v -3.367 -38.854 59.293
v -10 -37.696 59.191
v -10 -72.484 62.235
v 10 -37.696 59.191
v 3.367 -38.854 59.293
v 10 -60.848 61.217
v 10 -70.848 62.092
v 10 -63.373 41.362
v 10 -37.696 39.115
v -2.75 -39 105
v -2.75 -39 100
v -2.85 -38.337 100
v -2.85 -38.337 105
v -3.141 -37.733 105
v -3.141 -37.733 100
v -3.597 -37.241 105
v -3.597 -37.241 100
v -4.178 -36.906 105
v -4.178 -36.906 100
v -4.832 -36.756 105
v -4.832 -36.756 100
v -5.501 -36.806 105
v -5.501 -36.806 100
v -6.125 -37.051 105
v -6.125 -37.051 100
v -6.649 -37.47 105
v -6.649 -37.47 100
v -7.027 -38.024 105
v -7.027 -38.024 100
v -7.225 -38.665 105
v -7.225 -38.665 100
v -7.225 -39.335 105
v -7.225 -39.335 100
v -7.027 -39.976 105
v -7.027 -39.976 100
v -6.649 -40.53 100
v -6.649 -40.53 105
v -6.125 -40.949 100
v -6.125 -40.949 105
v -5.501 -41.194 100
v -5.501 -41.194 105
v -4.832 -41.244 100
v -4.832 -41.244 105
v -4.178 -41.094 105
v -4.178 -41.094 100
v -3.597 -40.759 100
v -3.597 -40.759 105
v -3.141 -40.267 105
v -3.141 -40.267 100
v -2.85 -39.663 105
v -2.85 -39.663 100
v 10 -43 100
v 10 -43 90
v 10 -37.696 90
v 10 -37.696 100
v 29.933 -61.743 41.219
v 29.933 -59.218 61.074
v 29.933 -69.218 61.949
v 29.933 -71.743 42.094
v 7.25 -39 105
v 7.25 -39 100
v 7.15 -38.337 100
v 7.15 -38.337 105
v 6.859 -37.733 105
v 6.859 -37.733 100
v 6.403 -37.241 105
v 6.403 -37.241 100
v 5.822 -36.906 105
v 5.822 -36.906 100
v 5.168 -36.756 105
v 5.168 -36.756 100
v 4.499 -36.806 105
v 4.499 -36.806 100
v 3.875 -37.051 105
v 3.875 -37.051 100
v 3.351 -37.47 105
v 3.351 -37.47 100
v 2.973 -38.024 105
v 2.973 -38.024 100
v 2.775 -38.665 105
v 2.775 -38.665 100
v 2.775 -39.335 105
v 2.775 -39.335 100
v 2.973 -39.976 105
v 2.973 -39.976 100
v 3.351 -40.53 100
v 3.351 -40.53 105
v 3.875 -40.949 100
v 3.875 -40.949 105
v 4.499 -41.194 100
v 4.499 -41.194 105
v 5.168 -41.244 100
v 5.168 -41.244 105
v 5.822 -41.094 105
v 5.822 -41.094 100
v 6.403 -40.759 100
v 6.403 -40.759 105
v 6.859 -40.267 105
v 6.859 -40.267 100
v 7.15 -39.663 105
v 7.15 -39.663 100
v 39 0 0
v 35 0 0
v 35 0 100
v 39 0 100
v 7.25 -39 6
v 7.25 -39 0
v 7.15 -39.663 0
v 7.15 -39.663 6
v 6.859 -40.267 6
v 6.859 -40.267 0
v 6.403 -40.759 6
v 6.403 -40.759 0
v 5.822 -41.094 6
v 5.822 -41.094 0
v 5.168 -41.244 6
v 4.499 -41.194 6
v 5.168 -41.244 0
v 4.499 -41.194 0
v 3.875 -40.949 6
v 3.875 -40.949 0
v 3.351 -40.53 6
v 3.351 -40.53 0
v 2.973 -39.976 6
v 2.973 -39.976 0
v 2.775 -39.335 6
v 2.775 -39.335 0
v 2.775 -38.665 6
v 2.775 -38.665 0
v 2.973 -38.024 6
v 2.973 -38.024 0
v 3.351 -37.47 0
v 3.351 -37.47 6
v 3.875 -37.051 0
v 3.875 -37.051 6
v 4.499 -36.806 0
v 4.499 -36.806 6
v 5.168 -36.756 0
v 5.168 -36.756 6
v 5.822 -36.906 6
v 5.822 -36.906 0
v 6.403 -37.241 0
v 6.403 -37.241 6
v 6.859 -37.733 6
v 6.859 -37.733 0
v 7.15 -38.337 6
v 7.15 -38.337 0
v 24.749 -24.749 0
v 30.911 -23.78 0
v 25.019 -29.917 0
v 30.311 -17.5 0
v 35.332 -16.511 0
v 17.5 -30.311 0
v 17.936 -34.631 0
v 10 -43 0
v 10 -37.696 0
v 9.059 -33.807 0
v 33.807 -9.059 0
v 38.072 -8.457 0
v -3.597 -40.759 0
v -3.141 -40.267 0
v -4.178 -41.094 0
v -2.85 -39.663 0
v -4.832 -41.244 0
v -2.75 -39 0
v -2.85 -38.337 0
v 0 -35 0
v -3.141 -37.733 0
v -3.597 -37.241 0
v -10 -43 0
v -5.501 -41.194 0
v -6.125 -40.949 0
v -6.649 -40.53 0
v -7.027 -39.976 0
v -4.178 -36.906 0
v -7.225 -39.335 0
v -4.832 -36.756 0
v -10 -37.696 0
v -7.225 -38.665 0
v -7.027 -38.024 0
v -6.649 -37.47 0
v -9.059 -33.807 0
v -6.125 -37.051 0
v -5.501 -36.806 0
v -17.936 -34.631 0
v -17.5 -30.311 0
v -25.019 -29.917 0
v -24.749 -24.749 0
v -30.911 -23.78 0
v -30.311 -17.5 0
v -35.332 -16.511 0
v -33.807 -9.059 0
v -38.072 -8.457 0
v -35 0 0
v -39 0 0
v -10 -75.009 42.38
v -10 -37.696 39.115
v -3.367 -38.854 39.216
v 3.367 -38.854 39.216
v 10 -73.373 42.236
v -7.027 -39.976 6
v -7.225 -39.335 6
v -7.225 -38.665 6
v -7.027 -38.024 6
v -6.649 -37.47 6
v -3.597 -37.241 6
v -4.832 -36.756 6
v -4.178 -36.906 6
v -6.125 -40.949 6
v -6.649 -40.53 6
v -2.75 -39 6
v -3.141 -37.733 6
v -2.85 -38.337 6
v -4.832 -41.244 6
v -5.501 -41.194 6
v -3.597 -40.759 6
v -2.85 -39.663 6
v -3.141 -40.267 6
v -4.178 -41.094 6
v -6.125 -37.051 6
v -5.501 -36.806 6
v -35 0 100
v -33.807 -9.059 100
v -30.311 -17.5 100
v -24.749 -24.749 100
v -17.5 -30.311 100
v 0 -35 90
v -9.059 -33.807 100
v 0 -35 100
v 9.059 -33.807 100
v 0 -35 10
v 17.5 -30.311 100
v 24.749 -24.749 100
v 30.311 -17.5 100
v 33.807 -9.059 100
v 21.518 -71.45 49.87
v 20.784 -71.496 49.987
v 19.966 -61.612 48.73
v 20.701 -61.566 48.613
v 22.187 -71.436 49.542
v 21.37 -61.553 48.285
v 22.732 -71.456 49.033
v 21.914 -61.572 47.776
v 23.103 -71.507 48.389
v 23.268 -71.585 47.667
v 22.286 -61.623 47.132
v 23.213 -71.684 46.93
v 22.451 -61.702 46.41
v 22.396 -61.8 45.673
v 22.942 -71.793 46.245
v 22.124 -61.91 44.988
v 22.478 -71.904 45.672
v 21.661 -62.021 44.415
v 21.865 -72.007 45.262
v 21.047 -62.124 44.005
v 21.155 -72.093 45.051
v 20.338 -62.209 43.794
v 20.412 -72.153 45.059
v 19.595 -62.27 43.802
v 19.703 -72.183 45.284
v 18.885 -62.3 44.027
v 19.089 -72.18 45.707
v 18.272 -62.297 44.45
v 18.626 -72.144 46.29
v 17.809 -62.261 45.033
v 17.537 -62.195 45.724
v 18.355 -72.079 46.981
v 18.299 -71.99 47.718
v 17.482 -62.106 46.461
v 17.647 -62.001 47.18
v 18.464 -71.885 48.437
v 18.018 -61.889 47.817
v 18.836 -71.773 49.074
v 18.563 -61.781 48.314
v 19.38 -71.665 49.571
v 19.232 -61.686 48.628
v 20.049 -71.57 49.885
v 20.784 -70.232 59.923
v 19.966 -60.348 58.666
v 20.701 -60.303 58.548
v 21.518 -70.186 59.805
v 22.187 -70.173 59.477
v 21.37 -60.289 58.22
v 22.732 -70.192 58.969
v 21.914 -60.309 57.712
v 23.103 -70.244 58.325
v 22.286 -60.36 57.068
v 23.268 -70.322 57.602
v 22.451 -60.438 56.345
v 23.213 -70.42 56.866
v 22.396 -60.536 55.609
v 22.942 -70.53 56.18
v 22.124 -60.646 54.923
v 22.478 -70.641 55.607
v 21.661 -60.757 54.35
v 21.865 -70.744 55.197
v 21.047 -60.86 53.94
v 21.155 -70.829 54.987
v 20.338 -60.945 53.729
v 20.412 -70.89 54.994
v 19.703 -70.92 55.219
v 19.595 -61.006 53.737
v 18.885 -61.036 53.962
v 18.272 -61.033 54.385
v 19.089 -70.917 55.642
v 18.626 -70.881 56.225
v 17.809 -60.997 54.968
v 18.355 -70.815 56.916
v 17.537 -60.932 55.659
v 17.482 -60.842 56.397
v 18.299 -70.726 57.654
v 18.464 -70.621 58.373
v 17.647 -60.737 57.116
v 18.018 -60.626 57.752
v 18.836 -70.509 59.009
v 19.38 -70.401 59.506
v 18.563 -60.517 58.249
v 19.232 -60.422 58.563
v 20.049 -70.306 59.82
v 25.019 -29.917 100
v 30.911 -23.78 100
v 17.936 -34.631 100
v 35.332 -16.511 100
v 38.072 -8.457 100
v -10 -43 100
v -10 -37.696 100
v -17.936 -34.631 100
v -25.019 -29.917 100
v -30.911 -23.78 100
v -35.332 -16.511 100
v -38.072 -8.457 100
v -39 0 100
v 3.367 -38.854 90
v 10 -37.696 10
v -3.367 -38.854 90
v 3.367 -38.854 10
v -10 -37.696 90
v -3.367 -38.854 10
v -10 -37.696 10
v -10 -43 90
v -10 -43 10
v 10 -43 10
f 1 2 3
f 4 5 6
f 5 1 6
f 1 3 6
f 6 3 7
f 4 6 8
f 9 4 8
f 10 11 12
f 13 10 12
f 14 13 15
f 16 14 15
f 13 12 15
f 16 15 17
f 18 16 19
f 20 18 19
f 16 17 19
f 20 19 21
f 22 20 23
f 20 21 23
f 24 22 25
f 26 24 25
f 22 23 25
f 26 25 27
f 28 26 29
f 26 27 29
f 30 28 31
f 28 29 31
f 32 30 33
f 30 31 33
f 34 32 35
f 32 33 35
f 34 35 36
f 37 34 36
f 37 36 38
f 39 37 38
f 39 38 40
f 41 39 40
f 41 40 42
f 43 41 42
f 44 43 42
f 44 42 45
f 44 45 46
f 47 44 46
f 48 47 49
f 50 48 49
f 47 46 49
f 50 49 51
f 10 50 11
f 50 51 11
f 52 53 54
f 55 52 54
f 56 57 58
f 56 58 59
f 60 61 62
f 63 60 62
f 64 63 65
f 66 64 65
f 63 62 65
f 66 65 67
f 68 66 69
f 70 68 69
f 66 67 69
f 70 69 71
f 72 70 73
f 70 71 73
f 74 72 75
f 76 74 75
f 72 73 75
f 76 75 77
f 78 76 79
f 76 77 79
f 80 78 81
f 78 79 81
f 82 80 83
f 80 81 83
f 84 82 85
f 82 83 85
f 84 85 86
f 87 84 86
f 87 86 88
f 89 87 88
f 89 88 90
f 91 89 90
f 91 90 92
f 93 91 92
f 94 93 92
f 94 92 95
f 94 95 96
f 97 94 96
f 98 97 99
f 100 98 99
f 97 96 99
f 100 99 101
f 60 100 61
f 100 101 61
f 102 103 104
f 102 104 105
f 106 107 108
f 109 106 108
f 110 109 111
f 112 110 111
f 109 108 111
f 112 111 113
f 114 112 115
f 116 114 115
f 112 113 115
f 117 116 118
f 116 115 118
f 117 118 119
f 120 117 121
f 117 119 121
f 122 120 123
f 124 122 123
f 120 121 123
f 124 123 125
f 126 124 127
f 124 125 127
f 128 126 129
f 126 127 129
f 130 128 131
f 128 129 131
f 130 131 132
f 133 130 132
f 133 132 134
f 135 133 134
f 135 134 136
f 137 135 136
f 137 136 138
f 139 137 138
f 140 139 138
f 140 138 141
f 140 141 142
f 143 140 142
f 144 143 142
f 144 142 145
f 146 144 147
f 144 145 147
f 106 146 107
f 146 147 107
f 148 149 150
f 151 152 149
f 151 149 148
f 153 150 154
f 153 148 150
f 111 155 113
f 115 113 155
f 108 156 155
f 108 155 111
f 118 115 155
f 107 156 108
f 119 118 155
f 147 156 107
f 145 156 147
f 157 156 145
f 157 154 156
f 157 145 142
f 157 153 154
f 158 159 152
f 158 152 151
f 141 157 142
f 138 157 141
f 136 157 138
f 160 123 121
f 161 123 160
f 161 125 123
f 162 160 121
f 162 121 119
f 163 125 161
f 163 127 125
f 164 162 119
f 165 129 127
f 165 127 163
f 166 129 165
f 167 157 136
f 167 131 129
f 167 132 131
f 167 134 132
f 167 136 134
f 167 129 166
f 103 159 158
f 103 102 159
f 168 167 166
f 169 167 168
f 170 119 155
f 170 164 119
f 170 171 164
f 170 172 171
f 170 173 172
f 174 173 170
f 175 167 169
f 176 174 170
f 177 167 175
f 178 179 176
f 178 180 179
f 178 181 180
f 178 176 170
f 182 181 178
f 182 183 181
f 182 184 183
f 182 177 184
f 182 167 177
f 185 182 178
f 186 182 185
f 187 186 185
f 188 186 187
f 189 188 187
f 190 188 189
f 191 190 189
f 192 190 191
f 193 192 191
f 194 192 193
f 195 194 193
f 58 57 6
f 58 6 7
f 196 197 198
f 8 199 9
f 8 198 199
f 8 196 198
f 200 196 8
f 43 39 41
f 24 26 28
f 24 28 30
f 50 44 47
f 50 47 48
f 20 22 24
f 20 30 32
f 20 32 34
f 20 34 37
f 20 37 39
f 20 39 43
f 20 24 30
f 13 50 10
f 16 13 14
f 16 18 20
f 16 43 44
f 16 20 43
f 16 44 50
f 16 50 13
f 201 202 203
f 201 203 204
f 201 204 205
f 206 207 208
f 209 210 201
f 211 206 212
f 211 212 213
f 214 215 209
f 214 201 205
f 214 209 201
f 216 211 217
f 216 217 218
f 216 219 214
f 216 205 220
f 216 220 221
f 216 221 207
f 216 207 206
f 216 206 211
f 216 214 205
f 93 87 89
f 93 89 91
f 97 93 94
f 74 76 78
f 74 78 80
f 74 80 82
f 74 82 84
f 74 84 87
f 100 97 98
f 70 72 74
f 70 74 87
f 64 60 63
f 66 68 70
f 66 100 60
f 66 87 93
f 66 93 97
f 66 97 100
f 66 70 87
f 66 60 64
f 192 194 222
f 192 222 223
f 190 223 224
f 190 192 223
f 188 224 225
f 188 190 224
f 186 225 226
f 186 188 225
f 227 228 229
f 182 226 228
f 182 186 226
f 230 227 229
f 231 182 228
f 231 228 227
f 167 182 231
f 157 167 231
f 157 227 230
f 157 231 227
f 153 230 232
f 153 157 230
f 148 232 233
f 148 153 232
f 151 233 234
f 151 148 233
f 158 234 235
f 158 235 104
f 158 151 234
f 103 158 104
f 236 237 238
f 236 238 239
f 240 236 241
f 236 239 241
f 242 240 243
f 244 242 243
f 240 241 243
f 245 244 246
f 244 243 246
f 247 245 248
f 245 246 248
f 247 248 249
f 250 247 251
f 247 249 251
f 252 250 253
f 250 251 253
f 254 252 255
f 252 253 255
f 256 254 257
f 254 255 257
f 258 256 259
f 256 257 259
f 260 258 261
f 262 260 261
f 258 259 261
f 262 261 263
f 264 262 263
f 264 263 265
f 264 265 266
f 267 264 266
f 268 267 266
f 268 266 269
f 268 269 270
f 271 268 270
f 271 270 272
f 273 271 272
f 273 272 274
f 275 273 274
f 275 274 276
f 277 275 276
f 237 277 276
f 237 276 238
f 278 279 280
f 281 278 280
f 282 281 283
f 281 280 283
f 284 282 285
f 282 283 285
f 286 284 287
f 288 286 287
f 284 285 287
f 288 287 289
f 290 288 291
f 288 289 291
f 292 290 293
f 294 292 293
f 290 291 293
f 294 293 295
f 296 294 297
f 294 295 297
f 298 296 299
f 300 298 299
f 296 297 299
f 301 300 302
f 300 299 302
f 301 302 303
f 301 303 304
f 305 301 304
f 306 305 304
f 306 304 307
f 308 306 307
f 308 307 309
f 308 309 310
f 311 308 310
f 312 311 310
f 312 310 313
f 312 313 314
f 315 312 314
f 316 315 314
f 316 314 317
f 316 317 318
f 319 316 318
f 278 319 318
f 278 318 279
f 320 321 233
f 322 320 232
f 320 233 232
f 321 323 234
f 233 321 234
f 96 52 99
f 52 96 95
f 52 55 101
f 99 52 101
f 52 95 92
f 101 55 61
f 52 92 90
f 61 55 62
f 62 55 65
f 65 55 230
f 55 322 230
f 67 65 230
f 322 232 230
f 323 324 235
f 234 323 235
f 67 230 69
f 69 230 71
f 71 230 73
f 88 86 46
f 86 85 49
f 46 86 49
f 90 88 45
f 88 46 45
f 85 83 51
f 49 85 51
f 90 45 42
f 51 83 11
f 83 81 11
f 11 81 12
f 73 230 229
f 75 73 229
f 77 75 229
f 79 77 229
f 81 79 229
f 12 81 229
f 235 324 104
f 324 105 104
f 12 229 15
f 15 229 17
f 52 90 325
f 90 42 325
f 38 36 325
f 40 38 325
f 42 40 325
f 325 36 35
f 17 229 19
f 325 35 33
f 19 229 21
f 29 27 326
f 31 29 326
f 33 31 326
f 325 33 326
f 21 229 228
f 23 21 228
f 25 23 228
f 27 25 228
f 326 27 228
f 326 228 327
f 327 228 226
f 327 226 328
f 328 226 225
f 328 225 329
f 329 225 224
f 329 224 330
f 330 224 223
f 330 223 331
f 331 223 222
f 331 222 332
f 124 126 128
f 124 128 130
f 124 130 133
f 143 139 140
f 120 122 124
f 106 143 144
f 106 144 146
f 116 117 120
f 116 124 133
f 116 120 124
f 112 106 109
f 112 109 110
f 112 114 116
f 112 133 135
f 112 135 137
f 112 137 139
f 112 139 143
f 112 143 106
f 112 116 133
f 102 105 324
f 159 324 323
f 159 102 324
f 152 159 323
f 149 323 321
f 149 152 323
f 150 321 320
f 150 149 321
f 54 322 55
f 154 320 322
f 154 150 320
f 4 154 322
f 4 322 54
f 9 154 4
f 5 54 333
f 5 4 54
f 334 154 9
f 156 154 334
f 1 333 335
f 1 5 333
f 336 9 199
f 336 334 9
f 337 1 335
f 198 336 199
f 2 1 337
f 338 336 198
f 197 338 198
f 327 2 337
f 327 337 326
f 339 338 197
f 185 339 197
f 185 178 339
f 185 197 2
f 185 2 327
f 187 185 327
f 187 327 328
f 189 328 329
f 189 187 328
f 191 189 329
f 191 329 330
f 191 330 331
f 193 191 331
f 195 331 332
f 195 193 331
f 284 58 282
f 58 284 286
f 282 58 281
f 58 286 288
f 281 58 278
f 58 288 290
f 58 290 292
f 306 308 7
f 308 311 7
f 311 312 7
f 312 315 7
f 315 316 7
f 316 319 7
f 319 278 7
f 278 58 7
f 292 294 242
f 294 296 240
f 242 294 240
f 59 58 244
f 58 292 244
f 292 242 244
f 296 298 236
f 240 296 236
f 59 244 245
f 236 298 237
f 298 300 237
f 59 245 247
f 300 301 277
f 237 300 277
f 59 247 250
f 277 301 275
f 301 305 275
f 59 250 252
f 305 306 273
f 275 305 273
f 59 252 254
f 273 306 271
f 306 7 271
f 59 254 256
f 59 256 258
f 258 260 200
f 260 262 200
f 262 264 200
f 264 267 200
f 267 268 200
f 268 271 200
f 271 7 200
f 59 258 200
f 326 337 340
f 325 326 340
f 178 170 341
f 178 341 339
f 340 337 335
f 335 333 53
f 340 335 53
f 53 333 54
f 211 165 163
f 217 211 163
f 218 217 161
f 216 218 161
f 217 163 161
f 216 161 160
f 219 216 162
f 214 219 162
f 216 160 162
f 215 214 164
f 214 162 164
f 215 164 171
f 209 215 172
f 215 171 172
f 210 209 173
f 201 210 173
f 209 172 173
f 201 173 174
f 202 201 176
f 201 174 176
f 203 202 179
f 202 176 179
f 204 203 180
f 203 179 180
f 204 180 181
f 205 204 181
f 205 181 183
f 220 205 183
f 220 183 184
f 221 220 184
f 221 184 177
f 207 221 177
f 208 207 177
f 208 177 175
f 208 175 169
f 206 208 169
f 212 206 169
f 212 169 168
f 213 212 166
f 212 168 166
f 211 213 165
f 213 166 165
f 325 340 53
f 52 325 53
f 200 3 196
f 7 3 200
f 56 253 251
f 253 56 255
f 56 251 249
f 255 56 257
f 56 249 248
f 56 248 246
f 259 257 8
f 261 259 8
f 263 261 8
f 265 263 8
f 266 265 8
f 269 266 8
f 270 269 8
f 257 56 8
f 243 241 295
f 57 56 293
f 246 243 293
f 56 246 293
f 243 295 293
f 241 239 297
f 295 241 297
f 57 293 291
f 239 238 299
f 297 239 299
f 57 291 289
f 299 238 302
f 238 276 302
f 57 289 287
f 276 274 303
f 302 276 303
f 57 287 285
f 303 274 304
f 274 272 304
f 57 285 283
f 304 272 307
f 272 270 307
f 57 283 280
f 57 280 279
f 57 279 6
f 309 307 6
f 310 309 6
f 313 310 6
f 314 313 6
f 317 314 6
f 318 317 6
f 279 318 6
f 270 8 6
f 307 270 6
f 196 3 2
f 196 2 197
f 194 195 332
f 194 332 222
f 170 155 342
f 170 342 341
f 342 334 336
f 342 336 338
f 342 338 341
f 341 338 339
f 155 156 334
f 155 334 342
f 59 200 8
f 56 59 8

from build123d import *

# Parameters (mm, degrees)
EXTRUDE_THIN1_DEPTH       = 100
BOSS_EXTRUDE1_START       = -10
BOSS_EXTRUDE1_DEPTH       = 10
SKETCH3_R                 = 2.25
BOSS_EXTRUDE2_DEPTH       = 5
BOSS_EXTRUDE3_DEPTH       = 10
SKETCH5_R                 = 2.25
CUT_EXTRUDE1_DEPTH        = 6
BOSS_EXTRUDE4_REACH       = 121.416
BOSS_EXTRUDE4_END_RADIUS  = 39
SKETCH10_W                = 20
SKETCH10_H                = 20
BOSS_EXTRUDE5_START       = -26.86522245
BOSS_EXTRUDE5_OUTLINE_W   = 20
BOSS_EXTRUDE5_OUTLINE_H   = 20
BOSS_EXTRUDE5_DEPTH       = 26.86522245
BOSS_EXTRUDE5_START_2     = 78.671989238
BOSS_EXTRUDE5_2_OUTLINE_W = 23
BOSS_EXTRUDE5_2_OUTLINE_H = 23
BOSS_EXTRUDE5_2_DEPTH     = 3.328010762
BOSS_EXTRUDE6_DEPTH       = 20
SKETCH12_R                = 2.5
CUT_EXTRUDE2_DEPTH        = 20


with BuildPart() as part:
    # Sketch1 → Extrude-Thin1 (new body)
    with BuildSketch(Plane.XY):
        with BuildLine():
            ThreePointArc((-35, 0), (0, -35), (35, 0))
            Line((35, 0), (39, 0))
            ThreePointArc((39, 0), (0, -39), (-39, 0))
            Line((-39, 0), (-35, 0))
        make_face()
    extrude(amount=EXTRUDE_THIN1_DEPTH)

    # Sketch2 → Boss-Extrude1 (add)
    with BuildSketch(Plane.XY.offset(100).offset(BOSS_EXTRUDE1_START)):
        with BuildLine():
            Line((0, -39), (0, -35))
            Line((0, -35), (-10, -35))
            Line((-10, -35), (-10, -37.69615365))
            ThreePointArc((-10, -37.69615365), (-5.042321274, -38.672664715), (0, -39))
        make_face()
        with BuildLine():
            Line((10, -35), (0, -35))
            Line((0, -35), (0, -39))
            ThreePointArc((0, -39), (5.042321274, -38.672664715), (10, -37.69615365))
            Line((10, -37.69615365), (10, -35))
        make_face()
        with BuildLine():
            ThreePointArc((10, -37.69615365), (5.042321274, -38.672664715), (0, -39))
            ThreePointArc((0, -39), (-5.042321274, -38.672664715), (-10, -37.69615365))
            Line((-10, -37.69615365), (-10, -43))
            Line((-10, -43), (10, -43))
            Line((10, -43), (10, -37.69615365))
        make_face()
    extrude(amount=BOSS_EXTRUDE1_DEPTH)

    # Sketch3 → Boss-Extrude2 (add)
    with BuildSketch(Plane.XY.offset(100)):
        with Locations((-5, -39)):
            Circle(SKETCH3_R)
        with Locations((5, -39)):
            Circle(SKETCH3_R)
    extrude(amount=BOSS_EXTRUDE2_DEPTH)

    # Sketch4 → Boss-Extrude3 (add)
    with BuildSketch(Plane(origin=(0, 0, 0), x_dir=(-1, 0, 0), z_dir=(0, 0, -1))):
        with BuildLine():
            Line((0, -39), (0, -35))
            Line((0, -35), (-10, -35))
            Line((-10, -35), (-10, -37.69615365))
            ThreePointArc((-10, -37.69615365), (-5.042321274, -38.672664715), (0, -39))
        make_face()
        with BuildLine():
            ThreePointArc((10, -37.69615365), (5.042321274, -38.672664715), (0, -39))
            ThreePointArc((0, -39), (-5.042321274, -38.672664715), (-10, -37.69615365))
            Line((-10, -37.69615365), (-10, -43))
            Line((-10, -43), (10, -43))
            Line((10, -43), (10, -37.69615365))
        make_face()
        with BuildLine():
            Line((10, -35), (0, -35))
            Line((0, -35), (0, -39))
            ThreePointArc((0, -39), (5.042321274, -38.672664715), (10, -37.69615365))
            Line((10, -37.69615365), (10, -35))
        make_face()
    extrude(amount=-BOSS_EXTRUDE3_DEPTH)

    # Sketch5 → Cut-Extrude1 (cut)
    with BuildSketch(Plane(origin=(0, 0, 0), x_dir=(-1, 0, 0), z_dir=(0, 0, -1))):
        with Locations(Location((-5, -39, 0), (0, 0, 180))):
            Circle(SKETCH5_R)
        with Locations(Location((5, -39, 0), (0, 0, 180))):
            Circle(SKETCH5_R)
    extrude(amount=-CUT_EXTRUDE1_DEPTH, mode=Mode.SUBTRACT)

    # Boss-Extrude4: up to this cylinder (the profile starts outside it)
    boss_extrude4_end = Plane(origin=(0, 0, 50), z_dir=(0, 0, -1)) * Cylinder(BOSS_EXTRUDE4_END_RADIUS, 321.832, mode=Mode.PRIVATE)
    # Sketch10 → Boss-Extrude4 (add, up to the surface)
    with BuildSketch(Plane(origin=(0, -51.355775573, 4.493048169), x_dir=(1, 0, 0), z_dir=(0, 0.9961946980917462, -0.08715574274765152)), mode=Mode.PRIVATE) as boss_extrude4_sk1:
        with Locations((0, -45.680780994)):
            Rectangle(SKETCH10_W, SKETCH10_H)
    boss_extrude4_tool1 = extrude(boss_extrude4_sk1.sketch, amount=BOSS_EXTRUDE4_REACH, mode=Mode.PRIVATE) - boss_extrude4_end
    add(boss_extrude4_tool1.solids().sort_by_distance((0, -47.374433, 50))[0])

    # Boss-Extrude5: read off the stored shape, not the designer's step
    # Boss-Extrude5 outline → Boss-Extrude5 (add)
    with BuildSketch(Plane(origin=(0, -51.355775573, 4.493048169), x_dir=(1, 0, 0), z_dir=(0, 0.9961946980917462, -0.08715574274765152)).offset(BOSS_EXTRUDE5_START)):
        with Locations((0, -45.680780994)):
            Rectangle(BOSS_EXTRUDE5_OUTLINE_W, BOSS_EXTRUDE5_OUTLINE_H)
    extrude(amount=BOSS_EXTRUDE5_DEPTH)

    # Boss-Extrude5 2 outline → Boss-Extrude5 2 (cut)
    with BuildSketch(Plane(origin=(0, 0, 0), x_dir=(0.9966522374056315, 0.0811043240761468, -0.010315342480997098), z_dir=(0.08175767654690848, -0.9886876617314986, 0.12574732548071493)).offset(BOSS_EXTRUDE5_START_2)):
        with Locations((-6.5, 42.5)):
            Rectangle(BOSS_EXTRUDE5_2_OUTLINE_W, BOSS_EXTRUDE5_2_OUTLINE_H)
    extrude(amount=BOSS_EXTRUDE5_2_DEPTH, mode=Mode.SUBTRACT)

    # Sketch11 → Boss-Extrude6 (add, along a direction that is not the sketch's normal)
    with BuildSketch(Plane(origin=(10, 0, 0), x_dir=(0, 0, -1), z_dir=(1, 0, 0))):
        Polygon((-42.236409552, -73.373320758), (-41.361522917, -63.373320758), (-61.216981199, -60.847982502), (-62.091867834, -70.847982502), align=None)
    extrude(amount=BOSS_EXTRUDE6_DEPTH, dir=(0.9966471031139101, 0.08150889038642521, -0.007131103885419538))

    # Sketch12 → Cut-Extrude2 (cut)
    with BuildSketch(Plane(origin=(5.614716446, -67.898222027, 8.635709896), x_dir=(0.9966522374056316, 0.0811043240761468, -0.010315342480997105), z_dir=(-0.08175767654690848, 0.9886876617314987, -0.12574732548071463))):
        with Locations(Location((14.399910724, -38.067319735, 0), (0, 0, 270))):
            Circle(SKETCH12_R)
        with Locations(Location((14.399910724, -48.082676206, 0), (0, 0, 270))):
            Circle(SKETCH12_R)
    extrude(amount=-CUT_EXTRUDE2_DEPTH, mode=Mode.SUBTRACT)


solid = part.part
